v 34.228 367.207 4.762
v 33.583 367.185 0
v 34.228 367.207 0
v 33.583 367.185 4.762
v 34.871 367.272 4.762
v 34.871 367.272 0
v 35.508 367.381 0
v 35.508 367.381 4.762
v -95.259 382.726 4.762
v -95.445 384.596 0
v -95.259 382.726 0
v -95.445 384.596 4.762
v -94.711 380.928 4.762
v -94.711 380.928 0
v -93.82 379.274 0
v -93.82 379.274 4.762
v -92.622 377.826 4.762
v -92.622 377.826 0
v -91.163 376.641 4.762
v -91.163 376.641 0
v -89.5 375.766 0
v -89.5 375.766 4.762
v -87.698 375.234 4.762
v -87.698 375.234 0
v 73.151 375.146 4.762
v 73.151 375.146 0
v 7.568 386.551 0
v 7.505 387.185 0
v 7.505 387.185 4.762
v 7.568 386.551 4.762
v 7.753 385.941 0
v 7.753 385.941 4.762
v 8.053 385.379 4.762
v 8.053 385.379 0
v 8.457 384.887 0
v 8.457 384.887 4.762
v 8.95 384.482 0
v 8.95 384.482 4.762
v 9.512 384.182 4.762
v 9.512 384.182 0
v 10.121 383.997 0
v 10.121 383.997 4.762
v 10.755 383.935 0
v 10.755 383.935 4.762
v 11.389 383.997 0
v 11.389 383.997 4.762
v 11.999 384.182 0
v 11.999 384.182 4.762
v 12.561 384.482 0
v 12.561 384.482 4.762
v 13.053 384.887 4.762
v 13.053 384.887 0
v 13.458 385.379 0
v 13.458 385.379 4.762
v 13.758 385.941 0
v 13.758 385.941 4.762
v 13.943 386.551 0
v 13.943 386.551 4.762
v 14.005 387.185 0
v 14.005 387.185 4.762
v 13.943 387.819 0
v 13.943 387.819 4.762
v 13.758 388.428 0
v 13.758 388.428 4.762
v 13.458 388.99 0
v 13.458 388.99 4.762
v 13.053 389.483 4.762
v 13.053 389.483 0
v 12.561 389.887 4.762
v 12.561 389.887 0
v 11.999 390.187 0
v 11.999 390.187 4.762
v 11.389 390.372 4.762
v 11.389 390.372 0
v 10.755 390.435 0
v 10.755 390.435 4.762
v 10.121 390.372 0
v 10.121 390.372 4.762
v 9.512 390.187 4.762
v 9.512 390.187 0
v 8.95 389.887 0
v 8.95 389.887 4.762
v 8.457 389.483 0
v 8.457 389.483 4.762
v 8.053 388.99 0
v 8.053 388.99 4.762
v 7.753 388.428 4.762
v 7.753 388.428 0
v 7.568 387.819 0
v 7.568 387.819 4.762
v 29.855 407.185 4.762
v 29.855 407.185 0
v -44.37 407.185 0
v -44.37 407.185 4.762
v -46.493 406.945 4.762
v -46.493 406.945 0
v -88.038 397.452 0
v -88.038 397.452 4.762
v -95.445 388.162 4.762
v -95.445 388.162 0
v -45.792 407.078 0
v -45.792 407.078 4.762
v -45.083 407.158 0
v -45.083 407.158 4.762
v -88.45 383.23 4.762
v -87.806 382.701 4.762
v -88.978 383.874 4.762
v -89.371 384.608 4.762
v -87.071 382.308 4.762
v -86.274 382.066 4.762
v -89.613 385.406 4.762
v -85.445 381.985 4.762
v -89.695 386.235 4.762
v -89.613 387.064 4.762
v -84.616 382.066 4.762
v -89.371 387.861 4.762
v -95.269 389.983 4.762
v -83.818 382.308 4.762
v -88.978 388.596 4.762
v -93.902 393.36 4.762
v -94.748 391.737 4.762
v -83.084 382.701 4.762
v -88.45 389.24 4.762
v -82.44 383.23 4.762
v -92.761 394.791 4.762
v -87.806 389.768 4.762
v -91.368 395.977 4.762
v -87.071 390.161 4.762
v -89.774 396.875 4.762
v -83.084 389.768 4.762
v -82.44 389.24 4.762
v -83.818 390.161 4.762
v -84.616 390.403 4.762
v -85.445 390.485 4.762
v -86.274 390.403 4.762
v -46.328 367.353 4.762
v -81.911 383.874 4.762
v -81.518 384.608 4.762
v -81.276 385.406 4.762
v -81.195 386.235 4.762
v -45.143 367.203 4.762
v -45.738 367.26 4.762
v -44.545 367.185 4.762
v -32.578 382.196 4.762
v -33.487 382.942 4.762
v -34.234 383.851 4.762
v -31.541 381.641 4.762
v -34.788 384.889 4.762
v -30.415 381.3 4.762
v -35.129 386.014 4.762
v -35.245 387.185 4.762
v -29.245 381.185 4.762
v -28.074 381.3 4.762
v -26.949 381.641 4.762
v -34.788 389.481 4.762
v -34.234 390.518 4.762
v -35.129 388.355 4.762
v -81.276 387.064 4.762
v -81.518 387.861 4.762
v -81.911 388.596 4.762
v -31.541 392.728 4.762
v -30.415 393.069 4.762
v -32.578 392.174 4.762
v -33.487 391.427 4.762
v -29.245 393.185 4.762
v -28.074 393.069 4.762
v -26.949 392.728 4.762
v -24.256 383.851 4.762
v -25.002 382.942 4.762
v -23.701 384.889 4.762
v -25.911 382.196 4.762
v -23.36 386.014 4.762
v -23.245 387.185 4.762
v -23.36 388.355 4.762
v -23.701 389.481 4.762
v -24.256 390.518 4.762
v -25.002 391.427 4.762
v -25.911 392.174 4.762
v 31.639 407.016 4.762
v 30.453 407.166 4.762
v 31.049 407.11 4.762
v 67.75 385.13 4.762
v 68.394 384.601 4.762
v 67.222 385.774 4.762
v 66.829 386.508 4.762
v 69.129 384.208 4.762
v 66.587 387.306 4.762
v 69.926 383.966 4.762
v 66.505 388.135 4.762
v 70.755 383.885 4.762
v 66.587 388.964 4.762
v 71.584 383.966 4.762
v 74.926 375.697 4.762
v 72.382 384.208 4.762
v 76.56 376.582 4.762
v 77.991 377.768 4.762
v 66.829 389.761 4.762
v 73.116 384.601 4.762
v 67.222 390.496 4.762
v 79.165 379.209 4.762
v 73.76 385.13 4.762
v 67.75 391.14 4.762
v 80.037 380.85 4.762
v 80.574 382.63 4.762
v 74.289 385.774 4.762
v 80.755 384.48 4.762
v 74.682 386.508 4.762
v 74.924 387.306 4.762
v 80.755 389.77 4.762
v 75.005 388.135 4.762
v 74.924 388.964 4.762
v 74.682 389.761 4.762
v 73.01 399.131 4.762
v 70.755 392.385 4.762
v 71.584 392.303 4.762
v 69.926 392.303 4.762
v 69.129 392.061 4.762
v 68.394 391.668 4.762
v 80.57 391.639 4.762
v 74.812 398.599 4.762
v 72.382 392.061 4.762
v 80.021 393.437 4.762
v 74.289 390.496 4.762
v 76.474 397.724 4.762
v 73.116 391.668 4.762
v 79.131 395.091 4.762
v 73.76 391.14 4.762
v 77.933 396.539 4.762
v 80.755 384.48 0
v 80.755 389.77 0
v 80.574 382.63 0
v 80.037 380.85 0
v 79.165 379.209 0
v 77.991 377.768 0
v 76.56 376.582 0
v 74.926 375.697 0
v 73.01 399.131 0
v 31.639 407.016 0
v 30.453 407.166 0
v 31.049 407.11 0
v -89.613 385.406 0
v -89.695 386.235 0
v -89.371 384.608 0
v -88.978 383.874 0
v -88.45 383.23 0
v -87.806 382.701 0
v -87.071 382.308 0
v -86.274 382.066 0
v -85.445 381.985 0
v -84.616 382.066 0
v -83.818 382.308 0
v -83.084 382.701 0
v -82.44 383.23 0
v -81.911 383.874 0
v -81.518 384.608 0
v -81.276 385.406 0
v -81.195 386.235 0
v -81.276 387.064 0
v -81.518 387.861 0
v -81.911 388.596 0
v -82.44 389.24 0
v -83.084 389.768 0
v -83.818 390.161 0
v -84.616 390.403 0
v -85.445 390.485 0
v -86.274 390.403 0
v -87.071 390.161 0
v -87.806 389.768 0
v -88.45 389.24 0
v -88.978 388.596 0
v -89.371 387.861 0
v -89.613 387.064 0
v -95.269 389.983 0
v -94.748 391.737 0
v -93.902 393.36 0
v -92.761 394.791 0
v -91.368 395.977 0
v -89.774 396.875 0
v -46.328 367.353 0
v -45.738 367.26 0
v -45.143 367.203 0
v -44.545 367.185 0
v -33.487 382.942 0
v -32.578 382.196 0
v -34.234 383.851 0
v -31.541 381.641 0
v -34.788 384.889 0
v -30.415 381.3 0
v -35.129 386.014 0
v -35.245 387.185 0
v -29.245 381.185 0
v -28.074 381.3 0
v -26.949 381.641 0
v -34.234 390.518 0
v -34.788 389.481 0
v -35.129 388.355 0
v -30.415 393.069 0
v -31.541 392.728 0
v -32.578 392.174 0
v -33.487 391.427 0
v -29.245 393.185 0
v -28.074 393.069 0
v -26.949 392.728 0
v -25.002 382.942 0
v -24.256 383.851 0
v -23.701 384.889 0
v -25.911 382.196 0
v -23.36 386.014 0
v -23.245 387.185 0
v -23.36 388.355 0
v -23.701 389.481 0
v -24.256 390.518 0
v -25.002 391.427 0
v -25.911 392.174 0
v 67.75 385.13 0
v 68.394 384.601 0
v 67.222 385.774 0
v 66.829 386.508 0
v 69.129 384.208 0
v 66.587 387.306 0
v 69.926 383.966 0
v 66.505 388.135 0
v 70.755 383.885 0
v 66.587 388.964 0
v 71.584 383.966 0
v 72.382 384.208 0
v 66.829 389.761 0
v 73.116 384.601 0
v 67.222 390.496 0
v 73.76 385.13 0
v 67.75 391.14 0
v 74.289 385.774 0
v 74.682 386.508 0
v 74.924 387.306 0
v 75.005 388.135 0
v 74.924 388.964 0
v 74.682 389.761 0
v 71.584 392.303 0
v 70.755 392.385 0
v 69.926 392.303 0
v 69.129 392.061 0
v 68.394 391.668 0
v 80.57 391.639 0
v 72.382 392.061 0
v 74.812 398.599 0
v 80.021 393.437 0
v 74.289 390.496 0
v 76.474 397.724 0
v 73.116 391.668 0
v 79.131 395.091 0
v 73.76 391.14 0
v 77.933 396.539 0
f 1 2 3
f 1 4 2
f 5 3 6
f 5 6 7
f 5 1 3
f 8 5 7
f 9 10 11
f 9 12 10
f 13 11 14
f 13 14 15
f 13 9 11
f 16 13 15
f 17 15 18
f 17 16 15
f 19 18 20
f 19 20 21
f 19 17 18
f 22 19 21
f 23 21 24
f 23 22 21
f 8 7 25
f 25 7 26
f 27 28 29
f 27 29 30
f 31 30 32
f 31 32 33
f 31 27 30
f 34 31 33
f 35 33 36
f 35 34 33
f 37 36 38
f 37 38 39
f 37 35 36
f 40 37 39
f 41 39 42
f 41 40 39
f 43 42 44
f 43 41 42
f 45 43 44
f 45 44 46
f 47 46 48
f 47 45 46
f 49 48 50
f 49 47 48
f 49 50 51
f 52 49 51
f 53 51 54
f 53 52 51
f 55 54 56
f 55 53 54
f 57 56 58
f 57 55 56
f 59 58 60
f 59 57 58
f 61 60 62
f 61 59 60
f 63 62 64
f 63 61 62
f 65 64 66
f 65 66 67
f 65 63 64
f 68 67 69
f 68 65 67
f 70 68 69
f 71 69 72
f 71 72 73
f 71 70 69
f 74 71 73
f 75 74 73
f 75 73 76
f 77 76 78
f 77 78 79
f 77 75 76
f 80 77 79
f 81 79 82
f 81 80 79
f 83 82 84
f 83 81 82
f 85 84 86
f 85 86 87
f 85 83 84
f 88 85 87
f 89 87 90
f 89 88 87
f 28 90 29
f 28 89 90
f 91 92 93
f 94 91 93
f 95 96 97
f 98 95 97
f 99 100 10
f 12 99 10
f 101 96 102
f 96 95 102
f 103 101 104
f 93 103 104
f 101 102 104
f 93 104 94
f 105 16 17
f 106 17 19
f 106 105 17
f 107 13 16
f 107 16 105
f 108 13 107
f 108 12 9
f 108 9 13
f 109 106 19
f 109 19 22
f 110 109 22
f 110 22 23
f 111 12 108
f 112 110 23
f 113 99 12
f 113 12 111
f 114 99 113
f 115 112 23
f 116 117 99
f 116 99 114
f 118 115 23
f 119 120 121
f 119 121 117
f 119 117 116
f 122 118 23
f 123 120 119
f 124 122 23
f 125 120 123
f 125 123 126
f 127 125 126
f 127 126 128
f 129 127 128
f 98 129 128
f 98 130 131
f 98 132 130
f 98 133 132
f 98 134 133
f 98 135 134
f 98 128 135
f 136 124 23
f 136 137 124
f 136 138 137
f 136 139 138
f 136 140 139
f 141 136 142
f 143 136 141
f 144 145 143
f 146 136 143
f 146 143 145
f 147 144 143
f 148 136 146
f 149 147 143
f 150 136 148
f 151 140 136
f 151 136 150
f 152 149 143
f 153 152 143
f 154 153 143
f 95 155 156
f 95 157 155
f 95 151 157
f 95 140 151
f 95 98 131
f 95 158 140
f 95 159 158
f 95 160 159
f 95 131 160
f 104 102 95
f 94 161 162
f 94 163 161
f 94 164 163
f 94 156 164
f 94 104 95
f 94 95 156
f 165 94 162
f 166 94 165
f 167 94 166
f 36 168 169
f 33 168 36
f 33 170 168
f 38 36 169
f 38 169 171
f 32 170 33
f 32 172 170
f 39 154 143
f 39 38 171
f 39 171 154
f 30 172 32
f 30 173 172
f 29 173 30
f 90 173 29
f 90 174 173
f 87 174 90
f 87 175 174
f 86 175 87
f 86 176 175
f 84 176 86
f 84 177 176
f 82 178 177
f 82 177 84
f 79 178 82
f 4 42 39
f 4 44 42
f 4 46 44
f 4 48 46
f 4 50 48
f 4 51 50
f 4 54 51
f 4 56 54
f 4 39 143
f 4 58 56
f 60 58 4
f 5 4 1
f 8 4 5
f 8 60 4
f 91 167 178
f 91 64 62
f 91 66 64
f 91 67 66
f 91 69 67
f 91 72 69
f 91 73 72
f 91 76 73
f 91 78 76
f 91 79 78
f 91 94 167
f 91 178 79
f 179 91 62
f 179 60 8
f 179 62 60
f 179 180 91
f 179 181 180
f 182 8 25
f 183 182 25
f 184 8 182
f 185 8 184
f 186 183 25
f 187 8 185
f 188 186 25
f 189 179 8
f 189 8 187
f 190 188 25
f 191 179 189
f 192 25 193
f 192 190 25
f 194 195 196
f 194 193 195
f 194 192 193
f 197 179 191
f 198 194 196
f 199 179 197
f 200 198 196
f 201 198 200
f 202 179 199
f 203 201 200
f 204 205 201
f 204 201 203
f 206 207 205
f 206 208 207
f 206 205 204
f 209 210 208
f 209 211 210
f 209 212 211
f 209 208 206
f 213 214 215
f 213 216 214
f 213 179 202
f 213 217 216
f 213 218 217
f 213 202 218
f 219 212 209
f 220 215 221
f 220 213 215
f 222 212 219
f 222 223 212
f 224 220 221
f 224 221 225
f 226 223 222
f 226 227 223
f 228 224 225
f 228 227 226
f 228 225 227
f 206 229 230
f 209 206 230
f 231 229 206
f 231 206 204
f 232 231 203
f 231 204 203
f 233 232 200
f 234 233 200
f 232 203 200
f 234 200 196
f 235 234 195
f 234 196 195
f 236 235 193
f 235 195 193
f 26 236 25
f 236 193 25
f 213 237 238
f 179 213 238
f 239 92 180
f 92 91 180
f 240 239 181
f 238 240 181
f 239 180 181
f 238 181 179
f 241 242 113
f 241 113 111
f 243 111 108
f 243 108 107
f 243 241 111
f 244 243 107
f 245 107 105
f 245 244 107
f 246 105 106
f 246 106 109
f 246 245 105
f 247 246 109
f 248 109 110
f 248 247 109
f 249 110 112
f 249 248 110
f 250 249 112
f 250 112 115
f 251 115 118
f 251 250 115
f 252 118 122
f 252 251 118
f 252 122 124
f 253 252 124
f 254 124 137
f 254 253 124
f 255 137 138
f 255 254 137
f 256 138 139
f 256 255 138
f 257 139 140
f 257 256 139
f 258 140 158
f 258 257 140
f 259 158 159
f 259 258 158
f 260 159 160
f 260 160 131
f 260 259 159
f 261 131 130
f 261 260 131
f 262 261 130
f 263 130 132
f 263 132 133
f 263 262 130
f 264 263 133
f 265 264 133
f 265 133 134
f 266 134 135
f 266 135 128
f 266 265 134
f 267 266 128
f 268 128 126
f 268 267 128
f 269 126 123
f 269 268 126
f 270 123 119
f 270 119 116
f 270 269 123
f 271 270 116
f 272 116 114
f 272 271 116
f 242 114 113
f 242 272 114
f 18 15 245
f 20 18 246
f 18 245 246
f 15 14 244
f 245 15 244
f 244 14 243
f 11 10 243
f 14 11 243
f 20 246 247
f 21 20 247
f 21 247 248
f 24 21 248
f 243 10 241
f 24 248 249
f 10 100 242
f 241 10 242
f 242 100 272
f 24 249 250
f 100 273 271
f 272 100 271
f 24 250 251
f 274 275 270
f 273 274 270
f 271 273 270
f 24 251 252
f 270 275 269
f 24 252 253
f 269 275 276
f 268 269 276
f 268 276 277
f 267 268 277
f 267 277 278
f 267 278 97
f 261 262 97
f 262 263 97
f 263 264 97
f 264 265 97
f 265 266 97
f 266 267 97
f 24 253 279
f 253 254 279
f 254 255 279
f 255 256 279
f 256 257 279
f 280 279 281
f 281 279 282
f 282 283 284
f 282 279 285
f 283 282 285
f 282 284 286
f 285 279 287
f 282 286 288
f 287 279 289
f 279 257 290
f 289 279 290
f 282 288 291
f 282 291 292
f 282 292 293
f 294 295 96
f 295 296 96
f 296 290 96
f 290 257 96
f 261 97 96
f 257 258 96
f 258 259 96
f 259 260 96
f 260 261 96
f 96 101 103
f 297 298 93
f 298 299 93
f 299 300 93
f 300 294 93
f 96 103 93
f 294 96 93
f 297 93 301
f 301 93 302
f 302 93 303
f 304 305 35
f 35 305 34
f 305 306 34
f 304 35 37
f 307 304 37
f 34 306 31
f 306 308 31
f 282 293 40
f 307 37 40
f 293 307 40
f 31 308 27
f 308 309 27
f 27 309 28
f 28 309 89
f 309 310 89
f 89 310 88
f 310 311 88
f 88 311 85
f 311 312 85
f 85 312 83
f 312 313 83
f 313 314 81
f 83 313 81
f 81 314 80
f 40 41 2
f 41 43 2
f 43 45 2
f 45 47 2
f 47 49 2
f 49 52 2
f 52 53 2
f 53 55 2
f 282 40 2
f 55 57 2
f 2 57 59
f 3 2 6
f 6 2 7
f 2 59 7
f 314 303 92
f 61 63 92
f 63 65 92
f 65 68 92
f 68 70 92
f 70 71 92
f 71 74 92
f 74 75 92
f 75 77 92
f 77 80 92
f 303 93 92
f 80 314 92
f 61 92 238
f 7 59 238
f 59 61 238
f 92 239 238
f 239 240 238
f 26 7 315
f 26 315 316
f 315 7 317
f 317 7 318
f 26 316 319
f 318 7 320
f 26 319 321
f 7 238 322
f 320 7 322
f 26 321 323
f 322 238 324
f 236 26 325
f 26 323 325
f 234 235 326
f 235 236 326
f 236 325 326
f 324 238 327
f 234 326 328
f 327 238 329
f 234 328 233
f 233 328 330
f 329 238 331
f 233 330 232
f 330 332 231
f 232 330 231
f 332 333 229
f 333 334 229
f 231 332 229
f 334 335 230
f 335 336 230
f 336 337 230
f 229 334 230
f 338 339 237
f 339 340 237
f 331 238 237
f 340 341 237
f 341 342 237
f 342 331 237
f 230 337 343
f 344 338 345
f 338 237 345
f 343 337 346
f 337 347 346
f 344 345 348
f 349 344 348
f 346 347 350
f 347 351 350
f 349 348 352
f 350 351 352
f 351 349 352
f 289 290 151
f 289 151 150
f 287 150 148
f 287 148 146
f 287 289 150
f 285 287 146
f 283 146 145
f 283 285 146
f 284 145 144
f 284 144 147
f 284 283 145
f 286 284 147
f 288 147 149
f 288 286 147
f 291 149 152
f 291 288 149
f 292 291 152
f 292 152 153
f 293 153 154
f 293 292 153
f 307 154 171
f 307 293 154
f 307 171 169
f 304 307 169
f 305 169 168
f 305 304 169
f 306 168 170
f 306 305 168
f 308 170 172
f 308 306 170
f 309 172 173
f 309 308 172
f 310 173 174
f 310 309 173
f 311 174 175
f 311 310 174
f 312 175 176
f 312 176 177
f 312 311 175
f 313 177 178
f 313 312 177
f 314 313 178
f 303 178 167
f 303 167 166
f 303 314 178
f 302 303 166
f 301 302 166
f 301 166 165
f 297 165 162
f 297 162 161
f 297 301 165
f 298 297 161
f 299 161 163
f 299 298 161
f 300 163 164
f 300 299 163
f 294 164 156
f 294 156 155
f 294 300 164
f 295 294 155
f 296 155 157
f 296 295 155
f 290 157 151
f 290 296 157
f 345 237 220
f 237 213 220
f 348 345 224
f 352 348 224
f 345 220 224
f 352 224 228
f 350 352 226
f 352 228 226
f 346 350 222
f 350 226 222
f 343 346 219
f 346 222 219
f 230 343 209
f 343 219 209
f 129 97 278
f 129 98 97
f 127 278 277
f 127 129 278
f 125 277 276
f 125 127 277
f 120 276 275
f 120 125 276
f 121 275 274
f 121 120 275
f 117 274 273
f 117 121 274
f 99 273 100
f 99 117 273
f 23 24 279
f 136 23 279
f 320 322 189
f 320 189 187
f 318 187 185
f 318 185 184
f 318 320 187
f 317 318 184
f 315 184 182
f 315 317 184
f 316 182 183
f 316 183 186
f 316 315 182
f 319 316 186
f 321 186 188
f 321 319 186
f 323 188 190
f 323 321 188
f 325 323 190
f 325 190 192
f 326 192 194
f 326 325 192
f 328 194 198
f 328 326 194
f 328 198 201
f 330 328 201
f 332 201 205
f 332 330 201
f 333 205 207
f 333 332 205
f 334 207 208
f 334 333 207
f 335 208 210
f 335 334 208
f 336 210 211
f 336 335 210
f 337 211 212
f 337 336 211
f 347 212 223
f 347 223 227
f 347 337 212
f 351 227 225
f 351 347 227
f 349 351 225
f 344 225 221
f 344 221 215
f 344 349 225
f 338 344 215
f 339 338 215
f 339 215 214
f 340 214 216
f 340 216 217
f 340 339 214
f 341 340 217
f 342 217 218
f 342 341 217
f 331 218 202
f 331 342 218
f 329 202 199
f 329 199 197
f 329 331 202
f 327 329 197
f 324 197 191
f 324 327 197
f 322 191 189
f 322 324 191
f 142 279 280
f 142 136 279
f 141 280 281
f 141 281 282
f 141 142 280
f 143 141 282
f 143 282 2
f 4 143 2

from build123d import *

# Parameters (mm, degrees)
SKETCH1_R           = 6
SKETCH1_R_2         = 3.25
SKETCH1_R_3         = 4.25
BOSS_EXTRUDE2_DEPTH = 4.7625
FILLET1_R           = 9.53


with BuildPart() as part:
    # Sketch1 → Boss-Extrude2 (new body)
    with BuildSketch(Plane.XY):
        Polygon((-45.444705817, 407.184725354), (-95.444705817, 395.759725354), (-95.444705817, 376.709725354), (-45.444705817, 367.184725354), (34.555294183, 367.184725354), (80.755294183, 376.714725354), (80.755294183, 397.654725354), (30.755294183, 407.184725354), align=None)
        with Locations(Location((-29.244705817, 387.184725354, 0), (0, 0, 180))):
            Circle(SKETCH1_R, mode=Mode.SUBTRACT)
        with Locations(Location((10.755294183, 387.184725354, 0), (0, 0, 180))):
            Circle(SKETCH1_R_2, mode=Mode.SUBTRACT)
        with Locations(Location((-85.444705817, 386.234725354, 0), (0, 0, 180))):
            Circle(SKETCH1_R_3, mode=Mode.SUBTRACT)
        with Locations(Location((70.755294183, 388.134725354, 0), (0, 0, 180))):
            Circle(SKETCH1_R_3, mode=Mode.SUBTRACT)
    extrude(amount=BOSS_EXTRUDE2_DEPTH)

    # Fillet1
    fillet1_edges = [part.edges().sort_by_distance(p)[0] for p in [
        (-95.444705817, 376.709725354, 2.38125),
        (-95.444705817, 395.759725354, 2.38125),
        (-45.444705817, 407.184725354, 2.38125),
        (30.755294183, 407.184725354, 2.38125),
        (80.755294183, 397.654725354, 2.38125),
        (80.755294183, 376.714725354, 2.38125),
        (34.555294183, 367.184725354, 2.38125),
        (-45.444705817, 367.184725354, 2.38125),
    ]]
    fillet(fillet1_edges, radius=FILLET1_R)


solid = part.part
